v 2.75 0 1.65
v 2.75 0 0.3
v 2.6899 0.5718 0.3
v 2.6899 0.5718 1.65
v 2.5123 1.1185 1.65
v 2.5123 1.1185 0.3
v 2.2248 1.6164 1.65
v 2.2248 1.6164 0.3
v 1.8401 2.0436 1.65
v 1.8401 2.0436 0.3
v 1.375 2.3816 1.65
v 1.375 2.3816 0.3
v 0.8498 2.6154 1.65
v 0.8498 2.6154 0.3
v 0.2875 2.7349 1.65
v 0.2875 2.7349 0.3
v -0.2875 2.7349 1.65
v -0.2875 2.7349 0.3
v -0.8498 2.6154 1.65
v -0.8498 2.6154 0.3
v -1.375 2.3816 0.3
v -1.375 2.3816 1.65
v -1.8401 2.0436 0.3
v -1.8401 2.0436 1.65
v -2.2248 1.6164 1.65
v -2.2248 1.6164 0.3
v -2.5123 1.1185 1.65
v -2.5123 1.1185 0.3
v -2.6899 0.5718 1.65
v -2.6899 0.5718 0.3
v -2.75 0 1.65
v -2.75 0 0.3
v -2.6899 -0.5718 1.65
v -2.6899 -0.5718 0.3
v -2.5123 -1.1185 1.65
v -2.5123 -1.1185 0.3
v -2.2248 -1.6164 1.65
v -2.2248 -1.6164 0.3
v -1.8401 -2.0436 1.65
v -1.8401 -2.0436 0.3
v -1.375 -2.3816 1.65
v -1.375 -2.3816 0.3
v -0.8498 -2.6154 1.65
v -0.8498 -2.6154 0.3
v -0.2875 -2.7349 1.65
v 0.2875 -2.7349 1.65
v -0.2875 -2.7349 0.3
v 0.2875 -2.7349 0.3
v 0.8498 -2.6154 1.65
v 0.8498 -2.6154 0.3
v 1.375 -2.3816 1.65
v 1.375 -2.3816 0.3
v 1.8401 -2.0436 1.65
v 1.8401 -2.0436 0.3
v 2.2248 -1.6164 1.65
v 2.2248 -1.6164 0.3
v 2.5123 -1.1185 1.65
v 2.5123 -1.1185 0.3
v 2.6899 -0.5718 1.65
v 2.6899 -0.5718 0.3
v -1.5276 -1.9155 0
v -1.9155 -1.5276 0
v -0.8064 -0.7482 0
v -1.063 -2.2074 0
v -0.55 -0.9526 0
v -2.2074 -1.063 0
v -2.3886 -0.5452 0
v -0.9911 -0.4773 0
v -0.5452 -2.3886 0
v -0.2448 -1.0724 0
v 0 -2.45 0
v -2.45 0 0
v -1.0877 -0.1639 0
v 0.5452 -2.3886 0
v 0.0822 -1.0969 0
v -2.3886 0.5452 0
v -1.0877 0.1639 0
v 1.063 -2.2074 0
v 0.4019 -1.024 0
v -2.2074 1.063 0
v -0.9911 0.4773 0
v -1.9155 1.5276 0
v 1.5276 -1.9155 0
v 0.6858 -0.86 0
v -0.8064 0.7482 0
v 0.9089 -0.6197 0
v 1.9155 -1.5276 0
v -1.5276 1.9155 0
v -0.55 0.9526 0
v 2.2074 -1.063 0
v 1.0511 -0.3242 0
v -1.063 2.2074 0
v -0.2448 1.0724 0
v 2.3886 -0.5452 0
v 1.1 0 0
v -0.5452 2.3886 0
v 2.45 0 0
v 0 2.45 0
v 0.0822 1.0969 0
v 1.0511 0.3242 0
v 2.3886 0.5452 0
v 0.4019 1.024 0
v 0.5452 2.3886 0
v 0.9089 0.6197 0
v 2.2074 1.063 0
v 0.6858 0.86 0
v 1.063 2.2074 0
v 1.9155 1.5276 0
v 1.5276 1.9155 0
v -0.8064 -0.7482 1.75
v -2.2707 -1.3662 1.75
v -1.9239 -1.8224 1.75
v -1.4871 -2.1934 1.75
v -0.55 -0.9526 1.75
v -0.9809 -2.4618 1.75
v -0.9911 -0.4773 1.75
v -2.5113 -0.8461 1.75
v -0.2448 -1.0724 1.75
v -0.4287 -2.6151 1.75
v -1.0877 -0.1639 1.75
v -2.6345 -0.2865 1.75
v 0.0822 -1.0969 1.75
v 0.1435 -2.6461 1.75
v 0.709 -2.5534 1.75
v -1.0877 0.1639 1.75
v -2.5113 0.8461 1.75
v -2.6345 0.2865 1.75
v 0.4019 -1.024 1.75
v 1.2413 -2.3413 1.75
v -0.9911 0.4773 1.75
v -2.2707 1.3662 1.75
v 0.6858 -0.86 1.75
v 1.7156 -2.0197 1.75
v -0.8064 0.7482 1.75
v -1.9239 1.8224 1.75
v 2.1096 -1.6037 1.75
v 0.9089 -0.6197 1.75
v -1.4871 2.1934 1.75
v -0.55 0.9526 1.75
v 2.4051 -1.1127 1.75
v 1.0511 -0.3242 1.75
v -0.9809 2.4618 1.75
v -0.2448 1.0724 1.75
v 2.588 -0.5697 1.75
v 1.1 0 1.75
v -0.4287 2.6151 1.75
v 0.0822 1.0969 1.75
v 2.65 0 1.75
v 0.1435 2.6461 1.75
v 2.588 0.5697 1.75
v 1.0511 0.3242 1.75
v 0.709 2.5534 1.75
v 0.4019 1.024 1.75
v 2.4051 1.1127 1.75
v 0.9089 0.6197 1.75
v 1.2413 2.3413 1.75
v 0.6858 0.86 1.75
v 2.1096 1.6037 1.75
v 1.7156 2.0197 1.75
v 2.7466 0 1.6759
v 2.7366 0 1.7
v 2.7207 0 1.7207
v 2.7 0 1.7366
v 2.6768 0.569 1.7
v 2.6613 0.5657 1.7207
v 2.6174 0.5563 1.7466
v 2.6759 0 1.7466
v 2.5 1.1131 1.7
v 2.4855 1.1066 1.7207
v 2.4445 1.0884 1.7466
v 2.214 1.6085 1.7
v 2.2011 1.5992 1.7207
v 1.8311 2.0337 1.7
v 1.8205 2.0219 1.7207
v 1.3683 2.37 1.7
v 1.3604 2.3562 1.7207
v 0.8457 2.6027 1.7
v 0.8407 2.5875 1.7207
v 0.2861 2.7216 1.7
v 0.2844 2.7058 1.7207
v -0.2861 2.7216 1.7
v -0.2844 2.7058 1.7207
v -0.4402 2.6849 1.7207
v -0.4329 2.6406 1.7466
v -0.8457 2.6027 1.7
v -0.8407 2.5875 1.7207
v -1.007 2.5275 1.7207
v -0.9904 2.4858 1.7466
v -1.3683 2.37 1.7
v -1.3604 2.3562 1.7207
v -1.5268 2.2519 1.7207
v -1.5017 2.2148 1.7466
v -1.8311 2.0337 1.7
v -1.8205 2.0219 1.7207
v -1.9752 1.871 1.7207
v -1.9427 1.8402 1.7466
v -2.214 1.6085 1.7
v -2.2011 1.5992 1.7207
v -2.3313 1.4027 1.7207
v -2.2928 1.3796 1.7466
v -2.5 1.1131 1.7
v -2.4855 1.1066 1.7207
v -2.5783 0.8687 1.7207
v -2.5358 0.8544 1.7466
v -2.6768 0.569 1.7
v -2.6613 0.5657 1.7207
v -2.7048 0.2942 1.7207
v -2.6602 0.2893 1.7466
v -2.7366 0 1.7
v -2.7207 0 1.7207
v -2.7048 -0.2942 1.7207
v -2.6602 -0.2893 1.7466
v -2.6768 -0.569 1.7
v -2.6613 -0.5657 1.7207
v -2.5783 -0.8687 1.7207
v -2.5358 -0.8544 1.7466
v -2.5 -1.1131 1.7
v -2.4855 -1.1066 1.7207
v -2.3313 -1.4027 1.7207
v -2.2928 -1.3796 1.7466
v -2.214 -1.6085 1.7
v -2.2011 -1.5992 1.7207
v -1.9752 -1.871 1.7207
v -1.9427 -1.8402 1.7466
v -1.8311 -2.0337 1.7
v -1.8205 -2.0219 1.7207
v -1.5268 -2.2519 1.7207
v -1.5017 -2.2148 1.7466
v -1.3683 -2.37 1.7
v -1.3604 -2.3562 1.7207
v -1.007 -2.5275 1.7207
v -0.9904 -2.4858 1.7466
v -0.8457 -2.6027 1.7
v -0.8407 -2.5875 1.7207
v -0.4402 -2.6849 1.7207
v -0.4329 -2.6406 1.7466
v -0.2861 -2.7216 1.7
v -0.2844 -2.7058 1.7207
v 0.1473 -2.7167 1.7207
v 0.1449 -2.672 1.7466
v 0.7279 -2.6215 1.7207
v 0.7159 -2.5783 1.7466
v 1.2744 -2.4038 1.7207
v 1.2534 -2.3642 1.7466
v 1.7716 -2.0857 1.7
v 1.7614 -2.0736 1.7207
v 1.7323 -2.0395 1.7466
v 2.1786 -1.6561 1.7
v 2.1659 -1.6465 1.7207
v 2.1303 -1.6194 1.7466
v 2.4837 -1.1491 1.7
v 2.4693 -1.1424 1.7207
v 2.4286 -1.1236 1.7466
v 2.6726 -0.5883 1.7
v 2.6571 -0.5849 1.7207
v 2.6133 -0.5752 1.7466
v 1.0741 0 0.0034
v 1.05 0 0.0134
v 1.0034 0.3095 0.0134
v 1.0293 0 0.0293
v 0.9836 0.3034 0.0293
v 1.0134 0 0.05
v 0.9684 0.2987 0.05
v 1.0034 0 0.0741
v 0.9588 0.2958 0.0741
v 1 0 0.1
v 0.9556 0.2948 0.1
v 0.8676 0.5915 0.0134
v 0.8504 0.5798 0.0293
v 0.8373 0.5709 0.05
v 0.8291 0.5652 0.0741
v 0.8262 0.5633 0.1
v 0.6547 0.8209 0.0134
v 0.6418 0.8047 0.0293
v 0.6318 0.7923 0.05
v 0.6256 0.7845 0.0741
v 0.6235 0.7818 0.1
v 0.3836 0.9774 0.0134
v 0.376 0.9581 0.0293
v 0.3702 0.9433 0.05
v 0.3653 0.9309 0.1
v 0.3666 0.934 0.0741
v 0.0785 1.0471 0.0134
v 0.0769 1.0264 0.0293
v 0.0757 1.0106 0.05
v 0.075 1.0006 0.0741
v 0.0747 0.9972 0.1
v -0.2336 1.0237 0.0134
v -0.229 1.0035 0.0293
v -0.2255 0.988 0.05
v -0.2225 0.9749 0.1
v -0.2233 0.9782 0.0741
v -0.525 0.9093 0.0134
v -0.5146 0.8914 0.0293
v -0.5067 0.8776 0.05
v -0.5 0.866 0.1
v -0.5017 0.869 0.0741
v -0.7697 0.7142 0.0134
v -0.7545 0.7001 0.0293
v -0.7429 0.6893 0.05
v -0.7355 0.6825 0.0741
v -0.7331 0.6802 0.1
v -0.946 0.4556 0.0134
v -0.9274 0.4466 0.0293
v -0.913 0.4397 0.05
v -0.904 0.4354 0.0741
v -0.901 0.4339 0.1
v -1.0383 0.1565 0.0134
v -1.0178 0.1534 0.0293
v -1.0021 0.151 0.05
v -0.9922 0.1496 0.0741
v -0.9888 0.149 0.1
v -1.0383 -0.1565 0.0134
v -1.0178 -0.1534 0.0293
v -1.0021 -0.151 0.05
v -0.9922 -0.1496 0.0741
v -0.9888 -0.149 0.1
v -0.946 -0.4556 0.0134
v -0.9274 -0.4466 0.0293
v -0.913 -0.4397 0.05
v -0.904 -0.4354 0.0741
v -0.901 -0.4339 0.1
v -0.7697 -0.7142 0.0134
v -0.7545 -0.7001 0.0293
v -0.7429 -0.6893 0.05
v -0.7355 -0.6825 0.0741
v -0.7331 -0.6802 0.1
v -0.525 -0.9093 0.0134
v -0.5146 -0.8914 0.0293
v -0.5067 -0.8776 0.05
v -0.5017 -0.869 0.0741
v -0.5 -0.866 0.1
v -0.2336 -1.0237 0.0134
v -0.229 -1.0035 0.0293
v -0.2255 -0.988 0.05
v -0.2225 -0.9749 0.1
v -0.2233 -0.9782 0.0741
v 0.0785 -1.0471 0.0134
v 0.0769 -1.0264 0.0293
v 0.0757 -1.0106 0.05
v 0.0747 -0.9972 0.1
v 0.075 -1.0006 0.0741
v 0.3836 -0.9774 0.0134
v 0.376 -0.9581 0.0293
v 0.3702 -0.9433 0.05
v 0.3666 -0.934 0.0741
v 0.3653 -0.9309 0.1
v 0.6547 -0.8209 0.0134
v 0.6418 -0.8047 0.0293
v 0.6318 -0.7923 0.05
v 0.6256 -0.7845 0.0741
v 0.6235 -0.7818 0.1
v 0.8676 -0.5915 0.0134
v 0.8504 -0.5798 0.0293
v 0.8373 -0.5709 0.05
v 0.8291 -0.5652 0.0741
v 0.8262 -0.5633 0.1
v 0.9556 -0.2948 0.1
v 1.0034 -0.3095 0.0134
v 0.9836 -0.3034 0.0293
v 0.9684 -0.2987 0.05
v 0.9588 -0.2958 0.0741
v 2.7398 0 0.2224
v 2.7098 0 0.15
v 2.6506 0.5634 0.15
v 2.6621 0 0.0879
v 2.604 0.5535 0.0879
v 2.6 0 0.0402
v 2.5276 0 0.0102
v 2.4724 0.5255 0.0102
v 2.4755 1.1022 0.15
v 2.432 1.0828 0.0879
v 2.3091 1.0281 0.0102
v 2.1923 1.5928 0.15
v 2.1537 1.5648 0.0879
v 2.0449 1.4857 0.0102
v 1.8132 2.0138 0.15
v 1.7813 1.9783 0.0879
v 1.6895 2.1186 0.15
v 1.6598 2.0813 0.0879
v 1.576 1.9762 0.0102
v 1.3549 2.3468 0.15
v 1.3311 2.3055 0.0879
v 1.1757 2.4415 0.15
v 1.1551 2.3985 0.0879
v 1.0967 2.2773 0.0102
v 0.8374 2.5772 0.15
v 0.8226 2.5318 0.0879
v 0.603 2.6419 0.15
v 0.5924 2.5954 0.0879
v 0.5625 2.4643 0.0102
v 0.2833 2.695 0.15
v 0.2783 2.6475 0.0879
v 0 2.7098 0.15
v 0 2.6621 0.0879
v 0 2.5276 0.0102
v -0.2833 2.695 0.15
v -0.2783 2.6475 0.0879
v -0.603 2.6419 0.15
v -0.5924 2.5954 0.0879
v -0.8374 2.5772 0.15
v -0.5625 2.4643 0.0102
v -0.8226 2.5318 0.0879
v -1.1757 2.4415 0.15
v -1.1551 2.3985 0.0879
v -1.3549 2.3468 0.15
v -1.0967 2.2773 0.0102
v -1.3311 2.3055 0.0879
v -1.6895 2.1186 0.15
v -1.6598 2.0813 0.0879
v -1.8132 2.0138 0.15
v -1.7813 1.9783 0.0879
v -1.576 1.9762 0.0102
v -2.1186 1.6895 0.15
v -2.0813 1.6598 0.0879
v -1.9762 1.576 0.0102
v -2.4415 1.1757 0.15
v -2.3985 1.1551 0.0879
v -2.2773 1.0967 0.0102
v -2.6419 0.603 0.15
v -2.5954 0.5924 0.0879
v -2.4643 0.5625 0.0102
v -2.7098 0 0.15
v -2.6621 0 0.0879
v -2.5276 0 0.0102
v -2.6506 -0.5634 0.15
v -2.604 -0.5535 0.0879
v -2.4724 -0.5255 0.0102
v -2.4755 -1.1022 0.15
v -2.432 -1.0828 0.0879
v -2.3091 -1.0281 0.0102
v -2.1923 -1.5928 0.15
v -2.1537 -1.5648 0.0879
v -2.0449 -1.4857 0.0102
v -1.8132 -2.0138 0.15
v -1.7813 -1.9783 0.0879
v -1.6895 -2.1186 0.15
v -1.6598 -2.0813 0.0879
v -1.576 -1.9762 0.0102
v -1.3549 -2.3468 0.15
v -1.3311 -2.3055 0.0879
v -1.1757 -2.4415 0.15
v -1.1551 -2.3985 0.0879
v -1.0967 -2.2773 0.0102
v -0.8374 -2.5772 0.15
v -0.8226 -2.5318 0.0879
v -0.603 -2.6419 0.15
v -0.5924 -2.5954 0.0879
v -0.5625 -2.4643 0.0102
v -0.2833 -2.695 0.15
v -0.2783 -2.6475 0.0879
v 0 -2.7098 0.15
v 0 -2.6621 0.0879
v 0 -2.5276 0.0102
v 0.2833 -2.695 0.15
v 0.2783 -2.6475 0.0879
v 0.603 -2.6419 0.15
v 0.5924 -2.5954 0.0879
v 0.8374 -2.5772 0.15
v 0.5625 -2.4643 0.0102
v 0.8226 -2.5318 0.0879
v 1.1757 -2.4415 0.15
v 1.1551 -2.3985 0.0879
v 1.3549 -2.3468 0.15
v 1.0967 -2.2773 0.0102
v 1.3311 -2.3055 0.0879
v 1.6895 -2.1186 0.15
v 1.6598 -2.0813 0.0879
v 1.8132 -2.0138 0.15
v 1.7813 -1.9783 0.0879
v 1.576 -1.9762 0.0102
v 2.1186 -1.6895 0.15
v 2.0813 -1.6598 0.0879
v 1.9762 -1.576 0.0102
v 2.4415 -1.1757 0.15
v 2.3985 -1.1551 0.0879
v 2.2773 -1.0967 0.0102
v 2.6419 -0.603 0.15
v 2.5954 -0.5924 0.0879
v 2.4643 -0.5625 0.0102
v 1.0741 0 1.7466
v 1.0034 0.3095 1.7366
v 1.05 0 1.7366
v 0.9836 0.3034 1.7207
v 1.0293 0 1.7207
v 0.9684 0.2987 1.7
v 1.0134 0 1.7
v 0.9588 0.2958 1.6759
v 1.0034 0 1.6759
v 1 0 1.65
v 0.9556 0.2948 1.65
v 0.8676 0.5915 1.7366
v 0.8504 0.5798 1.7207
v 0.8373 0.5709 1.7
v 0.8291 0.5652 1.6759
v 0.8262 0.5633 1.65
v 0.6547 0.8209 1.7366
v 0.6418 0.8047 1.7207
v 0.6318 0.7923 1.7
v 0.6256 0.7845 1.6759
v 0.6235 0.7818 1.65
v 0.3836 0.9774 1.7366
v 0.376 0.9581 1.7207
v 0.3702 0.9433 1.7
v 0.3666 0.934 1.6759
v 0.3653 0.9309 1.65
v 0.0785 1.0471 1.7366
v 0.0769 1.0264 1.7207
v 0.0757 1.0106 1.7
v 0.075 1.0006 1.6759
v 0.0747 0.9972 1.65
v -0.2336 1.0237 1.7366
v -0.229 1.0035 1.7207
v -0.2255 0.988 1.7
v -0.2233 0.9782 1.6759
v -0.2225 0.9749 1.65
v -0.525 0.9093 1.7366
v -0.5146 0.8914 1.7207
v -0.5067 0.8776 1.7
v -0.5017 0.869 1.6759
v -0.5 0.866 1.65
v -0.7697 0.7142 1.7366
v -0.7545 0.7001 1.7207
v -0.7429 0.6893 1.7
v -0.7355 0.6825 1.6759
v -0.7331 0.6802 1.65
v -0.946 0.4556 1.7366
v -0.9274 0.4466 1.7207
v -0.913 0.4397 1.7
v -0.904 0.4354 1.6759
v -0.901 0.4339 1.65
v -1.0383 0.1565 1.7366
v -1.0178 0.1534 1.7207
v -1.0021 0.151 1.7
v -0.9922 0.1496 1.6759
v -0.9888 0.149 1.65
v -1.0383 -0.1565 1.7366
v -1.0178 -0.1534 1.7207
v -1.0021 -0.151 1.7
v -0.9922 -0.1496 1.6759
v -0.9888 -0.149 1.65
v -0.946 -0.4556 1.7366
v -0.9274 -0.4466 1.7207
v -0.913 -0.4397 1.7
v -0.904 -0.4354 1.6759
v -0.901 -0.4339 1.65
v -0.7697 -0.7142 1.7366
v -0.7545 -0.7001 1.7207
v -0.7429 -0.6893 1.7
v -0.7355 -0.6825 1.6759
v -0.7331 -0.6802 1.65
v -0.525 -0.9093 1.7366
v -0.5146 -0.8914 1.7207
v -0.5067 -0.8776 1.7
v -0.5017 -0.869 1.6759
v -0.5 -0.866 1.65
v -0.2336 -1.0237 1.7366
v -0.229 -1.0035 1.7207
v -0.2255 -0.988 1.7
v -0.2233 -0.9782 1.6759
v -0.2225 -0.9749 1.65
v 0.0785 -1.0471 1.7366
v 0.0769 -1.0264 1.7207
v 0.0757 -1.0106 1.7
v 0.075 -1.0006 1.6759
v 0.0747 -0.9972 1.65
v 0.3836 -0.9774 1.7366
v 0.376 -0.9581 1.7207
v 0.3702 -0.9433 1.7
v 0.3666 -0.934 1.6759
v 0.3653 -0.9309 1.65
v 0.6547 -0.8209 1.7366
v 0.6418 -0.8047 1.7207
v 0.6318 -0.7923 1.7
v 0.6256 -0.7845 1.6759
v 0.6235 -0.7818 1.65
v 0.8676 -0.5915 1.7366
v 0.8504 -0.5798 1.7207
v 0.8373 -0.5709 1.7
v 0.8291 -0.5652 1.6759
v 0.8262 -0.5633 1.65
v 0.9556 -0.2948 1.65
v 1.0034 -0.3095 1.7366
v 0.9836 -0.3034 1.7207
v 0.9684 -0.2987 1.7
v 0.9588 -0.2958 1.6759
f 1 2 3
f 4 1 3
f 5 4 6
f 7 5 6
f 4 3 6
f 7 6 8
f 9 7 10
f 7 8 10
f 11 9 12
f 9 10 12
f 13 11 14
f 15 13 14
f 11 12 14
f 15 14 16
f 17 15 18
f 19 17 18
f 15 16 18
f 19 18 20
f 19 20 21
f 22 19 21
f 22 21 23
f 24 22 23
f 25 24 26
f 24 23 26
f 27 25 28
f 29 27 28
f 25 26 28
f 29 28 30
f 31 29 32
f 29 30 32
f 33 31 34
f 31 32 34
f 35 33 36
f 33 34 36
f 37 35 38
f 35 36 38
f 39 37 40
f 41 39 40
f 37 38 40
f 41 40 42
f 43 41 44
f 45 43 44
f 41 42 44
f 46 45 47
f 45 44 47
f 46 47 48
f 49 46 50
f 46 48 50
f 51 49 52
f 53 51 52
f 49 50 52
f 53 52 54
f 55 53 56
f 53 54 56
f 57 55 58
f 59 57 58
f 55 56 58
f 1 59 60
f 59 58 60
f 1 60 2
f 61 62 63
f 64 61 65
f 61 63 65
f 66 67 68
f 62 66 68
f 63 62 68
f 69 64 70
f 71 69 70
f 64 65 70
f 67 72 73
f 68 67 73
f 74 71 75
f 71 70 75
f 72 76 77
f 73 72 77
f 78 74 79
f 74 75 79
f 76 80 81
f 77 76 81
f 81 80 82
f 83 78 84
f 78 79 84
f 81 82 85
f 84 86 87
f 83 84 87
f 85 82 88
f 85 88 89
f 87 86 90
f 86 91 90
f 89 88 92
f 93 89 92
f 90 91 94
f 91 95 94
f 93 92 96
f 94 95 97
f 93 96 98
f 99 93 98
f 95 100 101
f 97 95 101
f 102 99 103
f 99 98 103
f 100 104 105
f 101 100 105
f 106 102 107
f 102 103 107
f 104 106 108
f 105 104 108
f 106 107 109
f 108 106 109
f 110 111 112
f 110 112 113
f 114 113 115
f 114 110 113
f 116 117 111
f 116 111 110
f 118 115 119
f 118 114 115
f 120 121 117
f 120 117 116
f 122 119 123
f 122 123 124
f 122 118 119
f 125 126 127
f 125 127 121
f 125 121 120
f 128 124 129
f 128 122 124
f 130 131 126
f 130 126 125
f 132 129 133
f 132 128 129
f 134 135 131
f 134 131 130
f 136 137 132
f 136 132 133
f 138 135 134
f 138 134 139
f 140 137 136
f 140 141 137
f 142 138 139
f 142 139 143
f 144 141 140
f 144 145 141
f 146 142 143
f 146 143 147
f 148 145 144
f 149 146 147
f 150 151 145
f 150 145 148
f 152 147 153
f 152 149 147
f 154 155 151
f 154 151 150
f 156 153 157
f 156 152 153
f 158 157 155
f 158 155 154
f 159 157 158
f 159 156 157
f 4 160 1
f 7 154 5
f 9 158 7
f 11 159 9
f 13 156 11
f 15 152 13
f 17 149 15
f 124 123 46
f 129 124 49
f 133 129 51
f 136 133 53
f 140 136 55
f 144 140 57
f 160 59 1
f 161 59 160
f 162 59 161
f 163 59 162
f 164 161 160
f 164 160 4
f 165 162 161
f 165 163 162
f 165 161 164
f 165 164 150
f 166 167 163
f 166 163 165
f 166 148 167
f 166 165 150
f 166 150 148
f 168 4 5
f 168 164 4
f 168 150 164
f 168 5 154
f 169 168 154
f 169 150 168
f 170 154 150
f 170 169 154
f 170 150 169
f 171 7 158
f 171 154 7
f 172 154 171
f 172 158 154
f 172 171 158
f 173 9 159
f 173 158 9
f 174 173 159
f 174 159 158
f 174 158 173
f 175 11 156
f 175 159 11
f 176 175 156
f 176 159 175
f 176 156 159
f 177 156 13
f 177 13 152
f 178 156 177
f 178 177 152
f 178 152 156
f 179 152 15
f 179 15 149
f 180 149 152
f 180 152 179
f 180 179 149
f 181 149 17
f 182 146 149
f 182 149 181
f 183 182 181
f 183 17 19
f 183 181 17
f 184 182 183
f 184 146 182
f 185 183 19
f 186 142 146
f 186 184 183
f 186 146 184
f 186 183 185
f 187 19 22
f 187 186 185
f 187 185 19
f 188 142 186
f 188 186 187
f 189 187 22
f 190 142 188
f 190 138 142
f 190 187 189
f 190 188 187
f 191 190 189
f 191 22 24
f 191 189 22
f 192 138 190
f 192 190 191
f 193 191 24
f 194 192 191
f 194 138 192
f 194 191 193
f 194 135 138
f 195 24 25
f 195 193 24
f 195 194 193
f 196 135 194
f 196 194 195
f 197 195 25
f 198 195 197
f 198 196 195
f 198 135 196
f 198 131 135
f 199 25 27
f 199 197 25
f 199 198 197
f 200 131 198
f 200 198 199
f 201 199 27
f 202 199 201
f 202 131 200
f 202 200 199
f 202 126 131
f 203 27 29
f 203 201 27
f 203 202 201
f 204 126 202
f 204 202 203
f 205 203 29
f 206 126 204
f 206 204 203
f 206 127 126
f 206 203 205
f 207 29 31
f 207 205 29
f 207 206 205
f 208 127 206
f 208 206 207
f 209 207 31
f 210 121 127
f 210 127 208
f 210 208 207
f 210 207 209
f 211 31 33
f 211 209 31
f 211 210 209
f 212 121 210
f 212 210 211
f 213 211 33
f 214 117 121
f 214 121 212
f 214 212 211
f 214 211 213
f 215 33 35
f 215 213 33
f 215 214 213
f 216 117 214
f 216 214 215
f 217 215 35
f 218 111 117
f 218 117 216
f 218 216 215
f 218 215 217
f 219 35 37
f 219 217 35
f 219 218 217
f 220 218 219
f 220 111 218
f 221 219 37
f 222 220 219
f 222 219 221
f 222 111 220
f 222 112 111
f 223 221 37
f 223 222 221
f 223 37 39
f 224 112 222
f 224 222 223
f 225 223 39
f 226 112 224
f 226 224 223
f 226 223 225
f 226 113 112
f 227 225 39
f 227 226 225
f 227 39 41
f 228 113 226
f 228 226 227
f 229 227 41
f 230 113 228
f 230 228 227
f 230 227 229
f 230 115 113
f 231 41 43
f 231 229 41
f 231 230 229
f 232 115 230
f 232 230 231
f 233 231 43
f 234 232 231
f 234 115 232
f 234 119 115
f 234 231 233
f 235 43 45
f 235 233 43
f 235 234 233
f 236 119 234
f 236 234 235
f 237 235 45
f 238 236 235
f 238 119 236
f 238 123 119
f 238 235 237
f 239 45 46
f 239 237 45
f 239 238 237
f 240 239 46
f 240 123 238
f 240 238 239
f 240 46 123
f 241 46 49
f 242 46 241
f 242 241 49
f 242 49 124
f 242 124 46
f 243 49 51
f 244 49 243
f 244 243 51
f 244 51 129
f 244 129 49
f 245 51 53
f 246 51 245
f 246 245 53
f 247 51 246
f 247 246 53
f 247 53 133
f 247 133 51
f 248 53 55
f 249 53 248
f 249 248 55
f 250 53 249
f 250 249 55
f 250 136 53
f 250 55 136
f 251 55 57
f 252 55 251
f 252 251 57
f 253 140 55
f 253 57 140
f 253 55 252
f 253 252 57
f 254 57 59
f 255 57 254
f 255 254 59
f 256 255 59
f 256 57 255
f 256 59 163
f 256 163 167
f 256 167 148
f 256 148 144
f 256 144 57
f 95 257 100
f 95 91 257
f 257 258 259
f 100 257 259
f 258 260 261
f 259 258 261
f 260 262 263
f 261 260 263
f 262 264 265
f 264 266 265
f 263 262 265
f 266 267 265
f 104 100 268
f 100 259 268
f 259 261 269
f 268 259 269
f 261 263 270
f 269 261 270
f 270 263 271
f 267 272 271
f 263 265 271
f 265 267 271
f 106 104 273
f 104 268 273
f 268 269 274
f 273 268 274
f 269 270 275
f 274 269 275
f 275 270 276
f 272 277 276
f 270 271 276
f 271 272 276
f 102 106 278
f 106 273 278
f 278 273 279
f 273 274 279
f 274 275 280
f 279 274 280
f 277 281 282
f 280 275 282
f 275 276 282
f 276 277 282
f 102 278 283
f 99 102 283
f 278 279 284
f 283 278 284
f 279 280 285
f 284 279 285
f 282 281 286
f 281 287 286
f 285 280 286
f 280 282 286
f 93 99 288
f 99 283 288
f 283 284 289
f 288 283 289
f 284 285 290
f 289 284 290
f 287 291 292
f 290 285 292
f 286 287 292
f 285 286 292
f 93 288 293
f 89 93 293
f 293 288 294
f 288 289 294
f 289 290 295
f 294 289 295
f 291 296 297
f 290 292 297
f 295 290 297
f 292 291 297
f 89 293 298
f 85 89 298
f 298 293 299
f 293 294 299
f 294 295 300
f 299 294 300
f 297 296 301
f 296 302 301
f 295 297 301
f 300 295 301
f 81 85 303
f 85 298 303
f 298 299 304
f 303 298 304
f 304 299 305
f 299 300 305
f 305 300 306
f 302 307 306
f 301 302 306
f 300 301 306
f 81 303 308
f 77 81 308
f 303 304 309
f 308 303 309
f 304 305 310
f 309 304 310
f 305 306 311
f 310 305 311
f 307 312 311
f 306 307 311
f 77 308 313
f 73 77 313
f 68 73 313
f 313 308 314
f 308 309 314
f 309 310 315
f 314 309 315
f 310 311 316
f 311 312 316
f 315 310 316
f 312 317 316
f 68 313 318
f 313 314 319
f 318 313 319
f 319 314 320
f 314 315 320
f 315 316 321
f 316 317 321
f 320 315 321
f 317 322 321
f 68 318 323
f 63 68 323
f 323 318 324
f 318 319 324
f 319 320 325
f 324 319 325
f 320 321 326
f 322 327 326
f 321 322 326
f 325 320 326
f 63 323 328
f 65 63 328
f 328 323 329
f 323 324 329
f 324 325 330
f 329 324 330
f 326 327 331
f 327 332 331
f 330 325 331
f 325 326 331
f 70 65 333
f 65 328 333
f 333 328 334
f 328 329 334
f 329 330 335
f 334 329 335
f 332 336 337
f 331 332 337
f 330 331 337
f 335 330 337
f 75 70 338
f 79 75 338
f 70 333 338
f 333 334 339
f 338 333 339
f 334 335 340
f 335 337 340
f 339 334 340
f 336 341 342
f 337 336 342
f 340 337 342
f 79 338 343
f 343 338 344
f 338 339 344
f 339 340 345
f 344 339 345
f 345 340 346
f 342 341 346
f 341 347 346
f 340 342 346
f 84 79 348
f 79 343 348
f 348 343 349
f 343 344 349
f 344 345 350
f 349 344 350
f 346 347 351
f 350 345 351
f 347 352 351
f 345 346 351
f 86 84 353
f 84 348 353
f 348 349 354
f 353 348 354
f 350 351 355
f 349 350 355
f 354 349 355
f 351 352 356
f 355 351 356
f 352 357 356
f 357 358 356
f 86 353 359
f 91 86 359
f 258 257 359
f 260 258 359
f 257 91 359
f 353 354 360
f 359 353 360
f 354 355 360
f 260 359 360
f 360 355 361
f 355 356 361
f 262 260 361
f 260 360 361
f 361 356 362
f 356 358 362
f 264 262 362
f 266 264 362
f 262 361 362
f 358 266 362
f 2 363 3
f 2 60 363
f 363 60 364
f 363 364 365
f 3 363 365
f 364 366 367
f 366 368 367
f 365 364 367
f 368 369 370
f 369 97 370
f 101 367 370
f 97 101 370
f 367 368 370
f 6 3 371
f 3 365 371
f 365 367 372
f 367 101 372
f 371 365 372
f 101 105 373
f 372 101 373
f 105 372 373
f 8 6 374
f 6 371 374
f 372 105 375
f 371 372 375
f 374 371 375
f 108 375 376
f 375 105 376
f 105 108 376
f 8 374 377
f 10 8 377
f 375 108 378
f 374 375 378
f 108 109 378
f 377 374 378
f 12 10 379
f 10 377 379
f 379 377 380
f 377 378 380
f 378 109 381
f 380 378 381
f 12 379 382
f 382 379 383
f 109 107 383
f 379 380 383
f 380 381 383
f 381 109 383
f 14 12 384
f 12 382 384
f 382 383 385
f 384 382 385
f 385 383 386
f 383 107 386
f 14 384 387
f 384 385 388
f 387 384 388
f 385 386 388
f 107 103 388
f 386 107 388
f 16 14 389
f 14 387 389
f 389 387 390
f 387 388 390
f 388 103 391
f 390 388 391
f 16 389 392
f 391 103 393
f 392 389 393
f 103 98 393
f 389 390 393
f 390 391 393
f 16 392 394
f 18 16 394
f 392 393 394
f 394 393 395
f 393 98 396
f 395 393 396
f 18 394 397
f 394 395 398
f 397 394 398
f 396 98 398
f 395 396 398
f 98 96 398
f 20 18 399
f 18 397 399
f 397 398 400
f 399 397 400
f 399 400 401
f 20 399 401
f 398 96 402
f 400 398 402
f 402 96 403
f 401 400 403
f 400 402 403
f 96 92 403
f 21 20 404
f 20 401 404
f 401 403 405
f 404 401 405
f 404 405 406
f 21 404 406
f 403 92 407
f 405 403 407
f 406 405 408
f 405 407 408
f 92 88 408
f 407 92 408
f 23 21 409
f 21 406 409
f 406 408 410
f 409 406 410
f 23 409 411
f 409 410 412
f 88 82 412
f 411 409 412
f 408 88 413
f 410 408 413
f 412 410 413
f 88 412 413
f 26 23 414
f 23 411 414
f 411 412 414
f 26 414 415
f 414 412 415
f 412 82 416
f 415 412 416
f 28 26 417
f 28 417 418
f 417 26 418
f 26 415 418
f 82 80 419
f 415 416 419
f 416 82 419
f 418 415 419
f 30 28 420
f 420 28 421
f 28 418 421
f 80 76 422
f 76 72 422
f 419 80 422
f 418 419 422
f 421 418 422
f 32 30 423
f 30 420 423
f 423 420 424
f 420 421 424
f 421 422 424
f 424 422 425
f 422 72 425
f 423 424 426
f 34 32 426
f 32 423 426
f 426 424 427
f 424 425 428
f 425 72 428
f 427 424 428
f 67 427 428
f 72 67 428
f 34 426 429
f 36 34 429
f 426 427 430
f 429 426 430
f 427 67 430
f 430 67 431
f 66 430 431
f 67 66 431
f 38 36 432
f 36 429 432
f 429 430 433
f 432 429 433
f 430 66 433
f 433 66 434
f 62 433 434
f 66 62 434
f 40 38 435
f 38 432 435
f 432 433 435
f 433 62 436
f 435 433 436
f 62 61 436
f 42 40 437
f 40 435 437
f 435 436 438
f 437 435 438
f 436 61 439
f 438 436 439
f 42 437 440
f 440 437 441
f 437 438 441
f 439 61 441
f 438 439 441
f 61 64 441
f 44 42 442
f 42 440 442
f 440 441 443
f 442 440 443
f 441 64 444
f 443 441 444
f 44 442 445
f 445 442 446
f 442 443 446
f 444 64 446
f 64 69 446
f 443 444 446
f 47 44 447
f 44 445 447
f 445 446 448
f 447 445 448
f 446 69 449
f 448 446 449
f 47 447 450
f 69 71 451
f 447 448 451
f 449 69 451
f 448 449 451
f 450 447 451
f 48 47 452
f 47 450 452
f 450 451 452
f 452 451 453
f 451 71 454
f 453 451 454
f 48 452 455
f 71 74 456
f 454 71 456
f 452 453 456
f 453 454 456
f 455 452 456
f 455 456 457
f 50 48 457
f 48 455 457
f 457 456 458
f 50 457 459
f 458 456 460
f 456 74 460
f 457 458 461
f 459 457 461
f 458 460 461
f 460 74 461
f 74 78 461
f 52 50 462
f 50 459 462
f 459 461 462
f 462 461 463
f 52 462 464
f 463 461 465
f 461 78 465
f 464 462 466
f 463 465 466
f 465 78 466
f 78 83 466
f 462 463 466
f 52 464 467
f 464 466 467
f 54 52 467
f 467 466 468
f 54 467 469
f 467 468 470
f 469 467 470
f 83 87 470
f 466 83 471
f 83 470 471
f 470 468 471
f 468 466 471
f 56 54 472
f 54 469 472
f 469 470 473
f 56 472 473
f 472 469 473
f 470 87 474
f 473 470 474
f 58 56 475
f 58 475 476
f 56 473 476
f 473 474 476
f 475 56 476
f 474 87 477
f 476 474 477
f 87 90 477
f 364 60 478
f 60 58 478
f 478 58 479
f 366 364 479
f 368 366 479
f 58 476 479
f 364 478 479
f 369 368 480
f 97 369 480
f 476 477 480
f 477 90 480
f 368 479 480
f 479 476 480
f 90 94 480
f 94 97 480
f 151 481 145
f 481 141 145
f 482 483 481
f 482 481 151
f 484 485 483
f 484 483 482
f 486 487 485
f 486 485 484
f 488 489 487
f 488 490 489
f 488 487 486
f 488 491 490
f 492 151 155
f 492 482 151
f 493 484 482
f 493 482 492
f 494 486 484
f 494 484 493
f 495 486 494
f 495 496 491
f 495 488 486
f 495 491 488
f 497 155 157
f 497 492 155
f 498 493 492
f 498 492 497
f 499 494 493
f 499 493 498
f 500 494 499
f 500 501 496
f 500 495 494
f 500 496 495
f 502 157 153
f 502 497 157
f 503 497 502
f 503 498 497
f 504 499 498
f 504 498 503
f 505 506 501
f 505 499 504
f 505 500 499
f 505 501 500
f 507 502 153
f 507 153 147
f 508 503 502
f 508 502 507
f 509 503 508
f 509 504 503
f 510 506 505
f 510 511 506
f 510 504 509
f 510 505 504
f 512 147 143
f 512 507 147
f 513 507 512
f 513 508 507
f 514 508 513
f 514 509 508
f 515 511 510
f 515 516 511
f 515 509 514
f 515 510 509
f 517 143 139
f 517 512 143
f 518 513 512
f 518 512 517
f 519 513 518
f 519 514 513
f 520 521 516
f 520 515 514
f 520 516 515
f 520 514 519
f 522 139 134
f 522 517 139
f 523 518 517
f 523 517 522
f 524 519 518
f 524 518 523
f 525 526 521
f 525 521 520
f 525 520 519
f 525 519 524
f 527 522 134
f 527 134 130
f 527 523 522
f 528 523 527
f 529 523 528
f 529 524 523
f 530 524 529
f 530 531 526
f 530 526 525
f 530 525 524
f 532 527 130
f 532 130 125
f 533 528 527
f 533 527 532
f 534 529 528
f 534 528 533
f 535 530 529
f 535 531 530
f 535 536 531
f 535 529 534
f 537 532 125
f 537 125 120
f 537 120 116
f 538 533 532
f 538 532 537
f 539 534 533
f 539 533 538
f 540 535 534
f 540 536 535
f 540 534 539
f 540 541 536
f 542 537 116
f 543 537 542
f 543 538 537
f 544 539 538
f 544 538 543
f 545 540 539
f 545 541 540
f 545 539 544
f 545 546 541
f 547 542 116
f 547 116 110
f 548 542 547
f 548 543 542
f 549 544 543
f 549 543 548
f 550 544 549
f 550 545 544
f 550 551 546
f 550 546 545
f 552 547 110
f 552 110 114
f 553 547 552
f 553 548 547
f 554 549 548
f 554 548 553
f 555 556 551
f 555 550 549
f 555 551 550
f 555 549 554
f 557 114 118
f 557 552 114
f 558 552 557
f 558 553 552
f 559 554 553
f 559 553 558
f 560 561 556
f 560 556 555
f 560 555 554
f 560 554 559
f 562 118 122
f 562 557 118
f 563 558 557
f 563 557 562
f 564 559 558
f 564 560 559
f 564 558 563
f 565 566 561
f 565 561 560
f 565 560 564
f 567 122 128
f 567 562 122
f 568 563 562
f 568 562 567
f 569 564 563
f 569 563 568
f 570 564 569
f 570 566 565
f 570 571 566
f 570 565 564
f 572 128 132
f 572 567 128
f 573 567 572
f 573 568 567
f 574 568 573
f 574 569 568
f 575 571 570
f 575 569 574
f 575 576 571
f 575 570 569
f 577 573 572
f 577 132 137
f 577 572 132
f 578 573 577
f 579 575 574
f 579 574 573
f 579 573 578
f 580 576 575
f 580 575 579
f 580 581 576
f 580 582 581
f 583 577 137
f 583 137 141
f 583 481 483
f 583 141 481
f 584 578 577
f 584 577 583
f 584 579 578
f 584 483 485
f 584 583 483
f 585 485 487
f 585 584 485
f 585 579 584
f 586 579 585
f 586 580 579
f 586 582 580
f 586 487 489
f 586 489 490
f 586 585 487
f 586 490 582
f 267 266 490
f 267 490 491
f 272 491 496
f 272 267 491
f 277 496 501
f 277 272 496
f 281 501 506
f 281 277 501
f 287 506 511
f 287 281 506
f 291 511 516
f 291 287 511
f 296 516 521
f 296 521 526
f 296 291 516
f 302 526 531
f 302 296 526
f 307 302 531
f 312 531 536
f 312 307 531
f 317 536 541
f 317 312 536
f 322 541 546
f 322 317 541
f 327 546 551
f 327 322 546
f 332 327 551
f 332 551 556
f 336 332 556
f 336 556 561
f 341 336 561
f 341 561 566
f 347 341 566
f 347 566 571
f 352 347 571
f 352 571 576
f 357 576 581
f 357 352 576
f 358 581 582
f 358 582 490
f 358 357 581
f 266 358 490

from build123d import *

# Parameters (mm, degrees)
SKETCH_1_R      = 2.75
SKETCH_1_R_2    = 1
EXTRUDE_1_DEPTH = 1.75
FILLET_1_R      = 0.3
FILLET_2_R      = 0.1


with BuildPart() as part:
    # 草图1 → 拉伸-薄壁1 (new body)
    with BuildSketch(Plane.XY):
        Circle(SKETCH_1_R)
        Circle(SKETCH_1_R_2, mode=Mode.SUBTRACT)
    extrude(amount=EXTRUDE_1_DEPTH)

    # 圆角1
    fillet_1_edges = [part.edges().sort_by_distance(p)[0] for p in [
        (-2.75, 0, 0),
    ]]
    fillet(fillet_1_edges, radius=FILLET_1_R)

    # 圆角2
    fillet_2_edges = [part.edges().sort_by_distance(p)[0] for p in [
        (-1, 0, 0),
        (-2.75, 0, 1.75),
        (-1, 0, 1.75),
    ]]
    fillet(fillet_2_edges, radius=FILLET_2_R)


solid = part.part
